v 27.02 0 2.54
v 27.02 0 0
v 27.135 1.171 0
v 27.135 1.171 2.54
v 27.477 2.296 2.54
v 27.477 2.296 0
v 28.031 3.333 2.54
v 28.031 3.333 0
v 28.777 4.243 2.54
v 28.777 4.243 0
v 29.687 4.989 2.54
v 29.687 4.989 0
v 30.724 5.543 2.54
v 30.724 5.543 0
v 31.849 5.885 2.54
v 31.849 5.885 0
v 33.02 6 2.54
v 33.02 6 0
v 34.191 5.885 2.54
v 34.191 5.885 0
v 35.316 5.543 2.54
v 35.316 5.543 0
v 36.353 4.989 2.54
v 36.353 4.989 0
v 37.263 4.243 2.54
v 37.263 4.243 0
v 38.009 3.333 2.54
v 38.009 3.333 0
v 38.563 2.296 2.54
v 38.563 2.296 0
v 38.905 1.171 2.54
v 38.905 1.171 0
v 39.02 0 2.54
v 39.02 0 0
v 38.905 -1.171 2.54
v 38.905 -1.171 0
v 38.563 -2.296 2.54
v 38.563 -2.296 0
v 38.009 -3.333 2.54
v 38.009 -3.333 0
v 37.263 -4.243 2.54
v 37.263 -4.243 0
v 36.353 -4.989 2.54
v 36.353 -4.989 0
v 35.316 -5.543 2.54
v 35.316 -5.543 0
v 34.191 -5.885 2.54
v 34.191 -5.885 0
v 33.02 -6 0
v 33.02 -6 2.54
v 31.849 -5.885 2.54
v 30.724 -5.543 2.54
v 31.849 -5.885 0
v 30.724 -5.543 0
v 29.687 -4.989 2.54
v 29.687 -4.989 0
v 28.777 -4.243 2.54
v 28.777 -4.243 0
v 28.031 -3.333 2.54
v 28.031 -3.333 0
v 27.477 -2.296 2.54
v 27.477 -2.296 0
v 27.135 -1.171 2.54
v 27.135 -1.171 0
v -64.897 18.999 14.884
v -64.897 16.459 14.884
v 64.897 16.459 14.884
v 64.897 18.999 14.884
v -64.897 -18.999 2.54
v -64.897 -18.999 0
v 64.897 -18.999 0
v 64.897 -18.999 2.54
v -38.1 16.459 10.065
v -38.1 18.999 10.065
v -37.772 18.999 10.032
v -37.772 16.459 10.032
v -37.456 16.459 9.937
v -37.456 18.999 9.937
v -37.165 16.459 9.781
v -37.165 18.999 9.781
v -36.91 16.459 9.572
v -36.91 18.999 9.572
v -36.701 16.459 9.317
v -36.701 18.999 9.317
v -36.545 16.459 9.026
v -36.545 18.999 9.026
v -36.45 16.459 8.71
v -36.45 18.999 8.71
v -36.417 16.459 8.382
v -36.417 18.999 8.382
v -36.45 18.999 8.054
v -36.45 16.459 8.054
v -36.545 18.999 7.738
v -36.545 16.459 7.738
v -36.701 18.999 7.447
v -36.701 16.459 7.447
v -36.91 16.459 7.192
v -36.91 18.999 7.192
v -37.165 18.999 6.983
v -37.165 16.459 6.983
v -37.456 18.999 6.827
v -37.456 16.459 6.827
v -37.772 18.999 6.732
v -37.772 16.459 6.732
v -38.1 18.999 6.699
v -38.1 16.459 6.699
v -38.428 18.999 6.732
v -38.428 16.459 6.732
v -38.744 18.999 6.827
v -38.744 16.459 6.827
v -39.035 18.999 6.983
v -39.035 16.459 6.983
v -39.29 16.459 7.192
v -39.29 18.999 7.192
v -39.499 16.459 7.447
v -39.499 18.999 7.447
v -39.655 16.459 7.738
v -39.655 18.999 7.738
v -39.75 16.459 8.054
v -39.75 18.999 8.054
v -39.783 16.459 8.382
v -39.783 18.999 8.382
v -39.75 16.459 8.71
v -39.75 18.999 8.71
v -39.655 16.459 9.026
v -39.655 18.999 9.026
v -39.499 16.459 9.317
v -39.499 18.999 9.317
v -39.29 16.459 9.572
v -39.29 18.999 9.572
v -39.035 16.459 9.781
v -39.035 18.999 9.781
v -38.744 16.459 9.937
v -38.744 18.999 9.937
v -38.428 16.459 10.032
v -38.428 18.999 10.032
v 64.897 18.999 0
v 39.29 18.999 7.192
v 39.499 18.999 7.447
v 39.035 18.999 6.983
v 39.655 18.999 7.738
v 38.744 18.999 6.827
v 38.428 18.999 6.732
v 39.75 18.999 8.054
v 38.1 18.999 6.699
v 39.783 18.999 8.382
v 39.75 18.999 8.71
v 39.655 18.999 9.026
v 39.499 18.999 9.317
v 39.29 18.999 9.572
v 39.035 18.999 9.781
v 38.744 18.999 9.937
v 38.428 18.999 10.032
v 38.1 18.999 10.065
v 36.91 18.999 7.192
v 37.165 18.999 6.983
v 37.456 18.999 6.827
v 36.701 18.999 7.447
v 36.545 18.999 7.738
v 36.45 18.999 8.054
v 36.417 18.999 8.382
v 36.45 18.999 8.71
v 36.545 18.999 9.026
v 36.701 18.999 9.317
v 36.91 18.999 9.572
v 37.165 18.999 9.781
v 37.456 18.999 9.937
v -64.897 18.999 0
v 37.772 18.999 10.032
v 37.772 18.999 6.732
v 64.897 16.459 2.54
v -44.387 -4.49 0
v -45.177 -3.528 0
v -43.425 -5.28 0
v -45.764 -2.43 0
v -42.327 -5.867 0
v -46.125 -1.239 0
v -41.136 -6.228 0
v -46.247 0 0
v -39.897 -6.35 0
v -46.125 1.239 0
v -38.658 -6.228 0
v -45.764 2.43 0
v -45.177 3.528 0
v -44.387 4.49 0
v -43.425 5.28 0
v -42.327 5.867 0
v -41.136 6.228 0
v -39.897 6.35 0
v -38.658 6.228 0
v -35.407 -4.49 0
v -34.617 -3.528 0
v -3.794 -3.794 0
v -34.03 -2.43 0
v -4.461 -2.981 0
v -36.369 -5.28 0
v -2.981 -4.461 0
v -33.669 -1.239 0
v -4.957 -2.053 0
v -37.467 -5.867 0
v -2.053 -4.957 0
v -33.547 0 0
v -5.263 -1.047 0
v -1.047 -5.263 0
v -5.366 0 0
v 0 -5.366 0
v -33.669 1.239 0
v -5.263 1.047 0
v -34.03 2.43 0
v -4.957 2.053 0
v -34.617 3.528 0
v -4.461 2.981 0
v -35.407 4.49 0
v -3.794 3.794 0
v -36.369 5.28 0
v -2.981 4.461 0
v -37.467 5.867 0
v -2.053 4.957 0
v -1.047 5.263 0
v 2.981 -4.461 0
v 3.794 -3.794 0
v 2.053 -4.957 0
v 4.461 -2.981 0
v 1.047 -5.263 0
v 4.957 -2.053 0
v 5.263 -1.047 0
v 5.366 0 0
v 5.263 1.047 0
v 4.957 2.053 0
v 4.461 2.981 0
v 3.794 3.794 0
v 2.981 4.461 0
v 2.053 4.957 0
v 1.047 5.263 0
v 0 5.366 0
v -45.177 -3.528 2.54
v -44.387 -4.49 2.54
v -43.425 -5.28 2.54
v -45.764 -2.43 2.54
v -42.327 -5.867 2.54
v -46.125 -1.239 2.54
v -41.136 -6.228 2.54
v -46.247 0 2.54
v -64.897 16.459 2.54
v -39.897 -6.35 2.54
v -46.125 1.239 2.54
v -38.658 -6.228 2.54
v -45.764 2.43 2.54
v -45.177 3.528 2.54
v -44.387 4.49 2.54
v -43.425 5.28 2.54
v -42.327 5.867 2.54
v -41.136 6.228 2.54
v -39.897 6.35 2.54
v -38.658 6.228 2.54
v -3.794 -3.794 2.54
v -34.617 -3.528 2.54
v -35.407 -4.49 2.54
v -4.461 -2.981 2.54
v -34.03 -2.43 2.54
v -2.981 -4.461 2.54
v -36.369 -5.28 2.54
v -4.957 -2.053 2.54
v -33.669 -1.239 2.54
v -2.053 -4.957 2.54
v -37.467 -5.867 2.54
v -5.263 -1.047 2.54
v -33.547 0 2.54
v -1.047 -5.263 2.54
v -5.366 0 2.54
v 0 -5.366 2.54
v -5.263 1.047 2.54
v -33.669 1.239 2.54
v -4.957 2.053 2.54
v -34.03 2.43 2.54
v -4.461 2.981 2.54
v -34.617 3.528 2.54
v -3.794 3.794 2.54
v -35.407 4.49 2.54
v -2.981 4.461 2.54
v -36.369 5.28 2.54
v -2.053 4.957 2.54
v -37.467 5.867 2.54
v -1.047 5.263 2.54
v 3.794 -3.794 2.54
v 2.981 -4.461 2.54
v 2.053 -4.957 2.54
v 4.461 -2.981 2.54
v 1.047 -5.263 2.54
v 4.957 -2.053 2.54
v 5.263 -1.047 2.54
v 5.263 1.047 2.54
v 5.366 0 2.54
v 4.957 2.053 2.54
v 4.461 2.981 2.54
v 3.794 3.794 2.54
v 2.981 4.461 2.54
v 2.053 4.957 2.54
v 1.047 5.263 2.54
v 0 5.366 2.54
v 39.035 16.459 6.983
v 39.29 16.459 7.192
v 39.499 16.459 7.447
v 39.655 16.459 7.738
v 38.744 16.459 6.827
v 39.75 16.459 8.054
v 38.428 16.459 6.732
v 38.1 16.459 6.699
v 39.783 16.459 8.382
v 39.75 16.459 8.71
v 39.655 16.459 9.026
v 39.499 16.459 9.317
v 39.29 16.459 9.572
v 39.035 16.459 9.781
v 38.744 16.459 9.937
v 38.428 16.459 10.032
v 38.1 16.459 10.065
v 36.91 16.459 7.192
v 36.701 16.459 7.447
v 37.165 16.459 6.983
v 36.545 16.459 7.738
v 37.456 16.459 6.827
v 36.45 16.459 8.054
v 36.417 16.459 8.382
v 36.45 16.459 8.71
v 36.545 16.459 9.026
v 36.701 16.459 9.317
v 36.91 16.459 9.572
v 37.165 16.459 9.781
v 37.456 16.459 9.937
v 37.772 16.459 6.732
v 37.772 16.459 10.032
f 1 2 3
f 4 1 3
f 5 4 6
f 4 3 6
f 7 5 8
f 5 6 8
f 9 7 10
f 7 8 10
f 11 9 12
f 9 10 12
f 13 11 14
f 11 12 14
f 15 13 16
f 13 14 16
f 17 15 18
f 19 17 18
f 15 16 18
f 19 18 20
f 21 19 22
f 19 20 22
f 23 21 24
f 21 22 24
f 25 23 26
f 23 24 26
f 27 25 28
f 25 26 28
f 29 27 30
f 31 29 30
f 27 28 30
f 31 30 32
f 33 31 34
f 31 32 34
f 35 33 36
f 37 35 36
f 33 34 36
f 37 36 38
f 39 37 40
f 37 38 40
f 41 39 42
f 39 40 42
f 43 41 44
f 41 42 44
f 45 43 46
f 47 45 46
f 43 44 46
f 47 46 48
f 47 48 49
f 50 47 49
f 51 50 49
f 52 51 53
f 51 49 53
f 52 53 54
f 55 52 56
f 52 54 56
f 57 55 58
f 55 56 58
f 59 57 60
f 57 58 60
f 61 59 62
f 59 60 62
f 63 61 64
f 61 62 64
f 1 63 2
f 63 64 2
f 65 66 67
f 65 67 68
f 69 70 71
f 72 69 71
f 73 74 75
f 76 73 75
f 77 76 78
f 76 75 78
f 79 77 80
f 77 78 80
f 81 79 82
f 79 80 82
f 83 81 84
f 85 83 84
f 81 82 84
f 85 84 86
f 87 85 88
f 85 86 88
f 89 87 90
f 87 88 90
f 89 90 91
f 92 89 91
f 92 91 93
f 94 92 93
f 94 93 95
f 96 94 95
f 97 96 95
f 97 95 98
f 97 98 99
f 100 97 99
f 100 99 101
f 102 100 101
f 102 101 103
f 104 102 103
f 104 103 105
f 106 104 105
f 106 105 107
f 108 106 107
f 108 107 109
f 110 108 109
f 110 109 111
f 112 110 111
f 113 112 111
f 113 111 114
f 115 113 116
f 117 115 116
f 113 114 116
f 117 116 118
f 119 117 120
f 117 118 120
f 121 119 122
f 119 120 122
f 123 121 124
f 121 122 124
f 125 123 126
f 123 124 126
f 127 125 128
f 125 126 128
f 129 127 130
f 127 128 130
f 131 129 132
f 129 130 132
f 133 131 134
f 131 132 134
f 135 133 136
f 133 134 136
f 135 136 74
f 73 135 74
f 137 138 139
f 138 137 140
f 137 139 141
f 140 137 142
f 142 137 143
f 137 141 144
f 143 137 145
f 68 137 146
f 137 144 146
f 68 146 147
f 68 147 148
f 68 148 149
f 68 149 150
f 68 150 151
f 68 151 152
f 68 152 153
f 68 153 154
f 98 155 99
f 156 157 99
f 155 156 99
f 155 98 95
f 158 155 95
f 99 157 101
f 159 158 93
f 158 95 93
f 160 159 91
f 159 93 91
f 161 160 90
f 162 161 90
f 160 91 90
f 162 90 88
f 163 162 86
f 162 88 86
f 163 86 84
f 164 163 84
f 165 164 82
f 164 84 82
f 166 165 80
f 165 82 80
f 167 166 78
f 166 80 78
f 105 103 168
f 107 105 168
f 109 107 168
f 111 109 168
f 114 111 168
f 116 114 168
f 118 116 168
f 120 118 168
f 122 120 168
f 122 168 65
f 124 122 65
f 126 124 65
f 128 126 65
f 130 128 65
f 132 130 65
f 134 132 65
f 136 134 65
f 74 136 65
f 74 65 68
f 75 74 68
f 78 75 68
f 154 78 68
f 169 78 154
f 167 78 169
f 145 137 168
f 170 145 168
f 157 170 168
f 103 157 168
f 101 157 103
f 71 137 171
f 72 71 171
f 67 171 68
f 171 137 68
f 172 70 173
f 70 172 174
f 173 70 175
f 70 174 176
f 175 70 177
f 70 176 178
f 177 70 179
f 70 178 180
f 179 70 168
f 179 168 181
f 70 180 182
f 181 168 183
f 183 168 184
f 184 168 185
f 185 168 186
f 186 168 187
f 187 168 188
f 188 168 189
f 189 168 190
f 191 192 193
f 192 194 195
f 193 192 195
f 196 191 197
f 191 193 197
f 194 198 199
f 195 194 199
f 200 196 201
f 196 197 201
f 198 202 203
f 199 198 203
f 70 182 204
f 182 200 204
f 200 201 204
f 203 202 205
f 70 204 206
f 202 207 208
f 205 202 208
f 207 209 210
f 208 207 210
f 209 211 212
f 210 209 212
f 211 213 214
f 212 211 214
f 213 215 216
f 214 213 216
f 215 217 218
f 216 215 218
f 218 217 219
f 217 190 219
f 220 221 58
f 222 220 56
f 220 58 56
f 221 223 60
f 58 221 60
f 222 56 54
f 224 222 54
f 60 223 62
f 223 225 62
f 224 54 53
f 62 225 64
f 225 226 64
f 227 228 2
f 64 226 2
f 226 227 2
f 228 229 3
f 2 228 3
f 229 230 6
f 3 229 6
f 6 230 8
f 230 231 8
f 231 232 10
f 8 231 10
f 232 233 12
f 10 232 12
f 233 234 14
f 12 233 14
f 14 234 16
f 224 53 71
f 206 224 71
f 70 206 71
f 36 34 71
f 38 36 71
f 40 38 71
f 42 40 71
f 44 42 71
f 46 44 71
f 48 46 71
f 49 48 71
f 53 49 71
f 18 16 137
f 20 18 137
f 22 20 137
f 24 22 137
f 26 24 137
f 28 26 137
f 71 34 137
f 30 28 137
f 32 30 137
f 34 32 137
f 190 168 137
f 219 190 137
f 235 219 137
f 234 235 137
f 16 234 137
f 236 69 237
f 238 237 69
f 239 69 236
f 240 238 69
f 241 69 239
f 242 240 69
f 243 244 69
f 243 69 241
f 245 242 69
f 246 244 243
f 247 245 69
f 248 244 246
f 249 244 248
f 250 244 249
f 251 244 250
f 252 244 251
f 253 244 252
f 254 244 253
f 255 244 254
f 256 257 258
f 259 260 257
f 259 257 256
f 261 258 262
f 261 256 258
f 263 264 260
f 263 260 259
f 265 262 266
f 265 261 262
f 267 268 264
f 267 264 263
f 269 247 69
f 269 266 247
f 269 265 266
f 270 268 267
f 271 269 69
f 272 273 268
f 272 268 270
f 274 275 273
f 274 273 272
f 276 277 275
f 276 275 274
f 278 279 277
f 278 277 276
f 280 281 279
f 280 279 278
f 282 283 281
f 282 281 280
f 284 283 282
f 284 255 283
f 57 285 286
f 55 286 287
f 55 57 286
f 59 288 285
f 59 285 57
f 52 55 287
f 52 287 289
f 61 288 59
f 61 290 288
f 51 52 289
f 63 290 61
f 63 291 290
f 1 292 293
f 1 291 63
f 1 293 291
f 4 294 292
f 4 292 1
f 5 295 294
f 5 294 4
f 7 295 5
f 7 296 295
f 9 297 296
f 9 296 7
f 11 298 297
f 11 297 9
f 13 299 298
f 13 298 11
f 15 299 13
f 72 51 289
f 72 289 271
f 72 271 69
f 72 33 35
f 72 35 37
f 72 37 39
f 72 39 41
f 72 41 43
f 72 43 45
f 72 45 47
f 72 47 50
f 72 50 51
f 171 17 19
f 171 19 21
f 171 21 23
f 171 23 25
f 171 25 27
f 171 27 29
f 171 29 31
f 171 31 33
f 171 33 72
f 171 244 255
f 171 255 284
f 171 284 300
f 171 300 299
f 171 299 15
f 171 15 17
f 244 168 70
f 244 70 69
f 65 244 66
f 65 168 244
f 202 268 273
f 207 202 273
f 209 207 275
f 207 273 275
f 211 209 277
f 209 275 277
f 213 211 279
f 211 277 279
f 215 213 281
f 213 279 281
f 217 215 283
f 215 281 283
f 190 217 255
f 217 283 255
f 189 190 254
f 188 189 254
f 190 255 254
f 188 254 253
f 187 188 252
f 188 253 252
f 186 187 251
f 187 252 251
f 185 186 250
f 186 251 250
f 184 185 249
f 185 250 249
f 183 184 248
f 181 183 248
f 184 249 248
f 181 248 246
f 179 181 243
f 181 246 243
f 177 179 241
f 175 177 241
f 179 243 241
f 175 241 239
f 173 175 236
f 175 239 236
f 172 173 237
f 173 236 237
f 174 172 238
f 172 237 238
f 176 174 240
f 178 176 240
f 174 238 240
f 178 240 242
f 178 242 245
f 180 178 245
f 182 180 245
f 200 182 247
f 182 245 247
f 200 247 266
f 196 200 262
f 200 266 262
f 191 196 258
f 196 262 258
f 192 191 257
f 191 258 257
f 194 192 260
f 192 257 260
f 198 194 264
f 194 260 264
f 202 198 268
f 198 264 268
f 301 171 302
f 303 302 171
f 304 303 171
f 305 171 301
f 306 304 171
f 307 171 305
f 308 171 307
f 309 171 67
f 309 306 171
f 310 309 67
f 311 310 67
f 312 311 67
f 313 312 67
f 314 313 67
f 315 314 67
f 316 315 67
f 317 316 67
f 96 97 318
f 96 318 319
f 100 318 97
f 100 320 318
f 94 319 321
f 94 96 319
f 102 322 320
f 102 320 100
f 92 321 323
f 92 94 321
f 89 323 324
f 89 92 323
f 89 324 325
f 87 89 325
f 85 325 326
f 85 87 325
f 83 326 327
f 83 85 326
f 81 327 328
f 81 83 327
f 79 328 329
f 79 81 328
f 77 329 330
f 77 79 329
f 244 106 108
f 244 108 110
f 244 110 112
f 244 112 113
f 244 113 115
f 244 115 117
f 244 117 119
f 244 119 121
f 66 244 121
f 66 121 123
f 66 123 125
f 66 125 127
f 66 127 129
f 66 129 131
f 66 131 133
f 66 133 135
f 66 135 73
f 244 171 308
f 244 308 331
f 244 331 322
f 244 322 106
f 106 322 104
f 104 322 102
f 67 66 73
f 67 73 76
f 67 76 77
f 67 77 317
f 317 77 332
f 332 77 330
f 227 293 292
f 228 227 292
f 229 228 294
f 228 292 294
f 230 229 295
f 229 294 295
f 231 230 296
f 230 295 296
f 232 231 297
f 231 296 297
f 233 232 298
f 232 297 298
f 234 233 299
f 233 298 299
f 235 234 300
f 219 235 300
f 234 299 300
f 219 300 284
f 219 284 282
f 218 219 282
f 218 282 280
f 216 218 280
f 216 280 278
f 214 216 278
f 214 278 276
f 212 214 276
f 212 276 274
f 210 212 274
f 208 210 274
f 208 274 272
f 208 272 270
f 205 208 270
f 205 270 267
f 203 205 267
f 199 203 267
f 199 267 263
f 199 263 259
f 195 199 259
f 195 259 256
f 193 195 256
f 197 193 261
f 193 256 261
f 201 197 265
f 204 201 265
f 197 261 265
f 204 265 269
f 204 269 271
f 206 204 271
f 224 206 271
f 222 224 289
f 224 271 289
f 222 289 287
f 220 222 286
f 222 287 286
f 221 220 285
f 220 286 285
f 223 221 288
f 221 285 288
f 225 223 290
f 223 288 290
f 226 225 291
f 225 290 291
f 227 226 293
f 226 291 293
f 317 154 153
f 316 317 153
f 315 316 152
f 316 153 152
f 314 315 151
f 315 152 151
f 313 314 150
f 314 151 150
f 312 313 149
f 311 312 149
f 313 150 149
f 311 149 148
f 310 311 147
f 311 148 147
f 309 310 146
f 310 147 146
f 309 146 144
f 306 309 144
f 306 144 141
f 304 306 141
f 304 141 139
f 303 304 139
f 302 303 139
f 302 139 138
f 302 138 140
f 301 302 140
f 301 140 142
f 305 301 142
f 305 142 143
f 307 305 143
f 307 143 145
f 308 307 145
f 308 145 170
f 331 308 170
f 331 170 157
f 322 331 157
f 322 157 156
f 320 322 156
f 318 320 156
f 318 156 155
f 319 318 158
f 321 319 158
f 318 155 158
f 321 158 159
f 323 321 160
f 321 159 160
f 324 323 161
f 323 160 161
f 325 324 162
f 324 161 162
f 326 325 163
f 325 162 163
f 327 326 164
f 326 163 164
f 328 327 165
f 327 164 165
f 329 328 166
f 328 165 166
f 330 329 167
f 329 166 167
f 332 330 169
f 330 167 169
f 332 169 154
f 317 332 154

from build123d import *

# Parameters (mm, degrees)
ESQUISSE1_W             = 129.794
ESQUISSE1_H             = 37.9984
BOSS_EXTRU_1_DEPTH      = 2.54
ESQUISSE2_W             = 12.3444
ESQUISSE2_H             = 2.54
BOSS_EXTRU_2_DEPTH      = 129.794
ESQUISSE3_R             = 5.36575
ENL_V_MAT_EXTRU_1_DEPTH = 69.738449364
ESQUISSE4_R             = 1.68275
ENL_V_MAT_EXTRU_2_DEPTH = 77.661883455
ESQUISSE5_R             = 6.35
ENL_V_MAT_EXTRU_3_DEPTH = 2.54
ESQUISSE7_R             = 6
ENL_V_MAT_EXTRU_4_DEPTH = 2.54


with BuildPart() as part:
    # Esquisse1 → Boss.-Extru.1 (new body)
    with BuildSketch(Plane.XY):
        Rectangle(ESQUISSE1_W, ESQUISSE1_H)
    extrude(amount=BOSS_EXTRU_1_DEPTH)

    # Esquisse2 → Boss.-Extru.2 (add)
    with BuildSketch(Plane.ZY.offset(64.897)):
        with Locations((8.7122, 17.7292)):
            Rectangle(ESQUISSE2_W, ESQUISSE2_H)
    extrude(amount=-BOSS_EXTRU_2_DEPTH)

    # Esquisse3 → Enlèv. mat.-Extru.1 (cut, through all)
    with BuildSketch(Plane.XY.offset(2.54)):
        Circle(ESQUISSE3_R)
    extrude(amount=-ENL_V_MAT_EXTRU_1_DEPTH, mode=Mode.SUBTRACT)

    # Esquisse4 → Enlèv. mat.-Extru.2 (cut, through all)
    with BuildSketch(Plane(origin=(0, 18.9992, 0), x_dir=(1, 0, 0), z_dir=(0, 1, 0))):
        with Locations(Location((-38.1, -8.382, 0), (0, 0, 270))):
            Circle(ESQUISSE4_R)
        with Locations(Location((38.1, -8.382, 0), (0, 0, 270))):
            Circle(ESQUISSE4_R)
    extrude(amount=-ENL_V_MAT_EXTRU_2_DEPTH, mode=Mode.SUBTRACT)

    # Esquisse5 → Enlèv. mat.-Extru.3 (cut)
    with BuildSketch(Plane.XY.offset(2.54)):
        with Locations((-39.897, 0)):
            Circle(ESQUISSE5_R)
    extrude(amount=-ENL_V_MAT_EXTRU_3_DEPTH, mode=Mode.SUBTRACT)

    # Esquisse7 → Enlèv. mat.-Extru.4 (cut)
    with BuildSketch(Plane(origin=(0, 0, 0), x_dir=(-1, 0, 0), z_dir=(0, 0, -1))):
        with Locations((-33.02, 0)):
            Circle(ESQUISSE7_R)
    extrude(amount=-ENL_V_MAT_EXTRU_4_DEPTH, mode=Mode.SUBTRACT)


solid = part.part
